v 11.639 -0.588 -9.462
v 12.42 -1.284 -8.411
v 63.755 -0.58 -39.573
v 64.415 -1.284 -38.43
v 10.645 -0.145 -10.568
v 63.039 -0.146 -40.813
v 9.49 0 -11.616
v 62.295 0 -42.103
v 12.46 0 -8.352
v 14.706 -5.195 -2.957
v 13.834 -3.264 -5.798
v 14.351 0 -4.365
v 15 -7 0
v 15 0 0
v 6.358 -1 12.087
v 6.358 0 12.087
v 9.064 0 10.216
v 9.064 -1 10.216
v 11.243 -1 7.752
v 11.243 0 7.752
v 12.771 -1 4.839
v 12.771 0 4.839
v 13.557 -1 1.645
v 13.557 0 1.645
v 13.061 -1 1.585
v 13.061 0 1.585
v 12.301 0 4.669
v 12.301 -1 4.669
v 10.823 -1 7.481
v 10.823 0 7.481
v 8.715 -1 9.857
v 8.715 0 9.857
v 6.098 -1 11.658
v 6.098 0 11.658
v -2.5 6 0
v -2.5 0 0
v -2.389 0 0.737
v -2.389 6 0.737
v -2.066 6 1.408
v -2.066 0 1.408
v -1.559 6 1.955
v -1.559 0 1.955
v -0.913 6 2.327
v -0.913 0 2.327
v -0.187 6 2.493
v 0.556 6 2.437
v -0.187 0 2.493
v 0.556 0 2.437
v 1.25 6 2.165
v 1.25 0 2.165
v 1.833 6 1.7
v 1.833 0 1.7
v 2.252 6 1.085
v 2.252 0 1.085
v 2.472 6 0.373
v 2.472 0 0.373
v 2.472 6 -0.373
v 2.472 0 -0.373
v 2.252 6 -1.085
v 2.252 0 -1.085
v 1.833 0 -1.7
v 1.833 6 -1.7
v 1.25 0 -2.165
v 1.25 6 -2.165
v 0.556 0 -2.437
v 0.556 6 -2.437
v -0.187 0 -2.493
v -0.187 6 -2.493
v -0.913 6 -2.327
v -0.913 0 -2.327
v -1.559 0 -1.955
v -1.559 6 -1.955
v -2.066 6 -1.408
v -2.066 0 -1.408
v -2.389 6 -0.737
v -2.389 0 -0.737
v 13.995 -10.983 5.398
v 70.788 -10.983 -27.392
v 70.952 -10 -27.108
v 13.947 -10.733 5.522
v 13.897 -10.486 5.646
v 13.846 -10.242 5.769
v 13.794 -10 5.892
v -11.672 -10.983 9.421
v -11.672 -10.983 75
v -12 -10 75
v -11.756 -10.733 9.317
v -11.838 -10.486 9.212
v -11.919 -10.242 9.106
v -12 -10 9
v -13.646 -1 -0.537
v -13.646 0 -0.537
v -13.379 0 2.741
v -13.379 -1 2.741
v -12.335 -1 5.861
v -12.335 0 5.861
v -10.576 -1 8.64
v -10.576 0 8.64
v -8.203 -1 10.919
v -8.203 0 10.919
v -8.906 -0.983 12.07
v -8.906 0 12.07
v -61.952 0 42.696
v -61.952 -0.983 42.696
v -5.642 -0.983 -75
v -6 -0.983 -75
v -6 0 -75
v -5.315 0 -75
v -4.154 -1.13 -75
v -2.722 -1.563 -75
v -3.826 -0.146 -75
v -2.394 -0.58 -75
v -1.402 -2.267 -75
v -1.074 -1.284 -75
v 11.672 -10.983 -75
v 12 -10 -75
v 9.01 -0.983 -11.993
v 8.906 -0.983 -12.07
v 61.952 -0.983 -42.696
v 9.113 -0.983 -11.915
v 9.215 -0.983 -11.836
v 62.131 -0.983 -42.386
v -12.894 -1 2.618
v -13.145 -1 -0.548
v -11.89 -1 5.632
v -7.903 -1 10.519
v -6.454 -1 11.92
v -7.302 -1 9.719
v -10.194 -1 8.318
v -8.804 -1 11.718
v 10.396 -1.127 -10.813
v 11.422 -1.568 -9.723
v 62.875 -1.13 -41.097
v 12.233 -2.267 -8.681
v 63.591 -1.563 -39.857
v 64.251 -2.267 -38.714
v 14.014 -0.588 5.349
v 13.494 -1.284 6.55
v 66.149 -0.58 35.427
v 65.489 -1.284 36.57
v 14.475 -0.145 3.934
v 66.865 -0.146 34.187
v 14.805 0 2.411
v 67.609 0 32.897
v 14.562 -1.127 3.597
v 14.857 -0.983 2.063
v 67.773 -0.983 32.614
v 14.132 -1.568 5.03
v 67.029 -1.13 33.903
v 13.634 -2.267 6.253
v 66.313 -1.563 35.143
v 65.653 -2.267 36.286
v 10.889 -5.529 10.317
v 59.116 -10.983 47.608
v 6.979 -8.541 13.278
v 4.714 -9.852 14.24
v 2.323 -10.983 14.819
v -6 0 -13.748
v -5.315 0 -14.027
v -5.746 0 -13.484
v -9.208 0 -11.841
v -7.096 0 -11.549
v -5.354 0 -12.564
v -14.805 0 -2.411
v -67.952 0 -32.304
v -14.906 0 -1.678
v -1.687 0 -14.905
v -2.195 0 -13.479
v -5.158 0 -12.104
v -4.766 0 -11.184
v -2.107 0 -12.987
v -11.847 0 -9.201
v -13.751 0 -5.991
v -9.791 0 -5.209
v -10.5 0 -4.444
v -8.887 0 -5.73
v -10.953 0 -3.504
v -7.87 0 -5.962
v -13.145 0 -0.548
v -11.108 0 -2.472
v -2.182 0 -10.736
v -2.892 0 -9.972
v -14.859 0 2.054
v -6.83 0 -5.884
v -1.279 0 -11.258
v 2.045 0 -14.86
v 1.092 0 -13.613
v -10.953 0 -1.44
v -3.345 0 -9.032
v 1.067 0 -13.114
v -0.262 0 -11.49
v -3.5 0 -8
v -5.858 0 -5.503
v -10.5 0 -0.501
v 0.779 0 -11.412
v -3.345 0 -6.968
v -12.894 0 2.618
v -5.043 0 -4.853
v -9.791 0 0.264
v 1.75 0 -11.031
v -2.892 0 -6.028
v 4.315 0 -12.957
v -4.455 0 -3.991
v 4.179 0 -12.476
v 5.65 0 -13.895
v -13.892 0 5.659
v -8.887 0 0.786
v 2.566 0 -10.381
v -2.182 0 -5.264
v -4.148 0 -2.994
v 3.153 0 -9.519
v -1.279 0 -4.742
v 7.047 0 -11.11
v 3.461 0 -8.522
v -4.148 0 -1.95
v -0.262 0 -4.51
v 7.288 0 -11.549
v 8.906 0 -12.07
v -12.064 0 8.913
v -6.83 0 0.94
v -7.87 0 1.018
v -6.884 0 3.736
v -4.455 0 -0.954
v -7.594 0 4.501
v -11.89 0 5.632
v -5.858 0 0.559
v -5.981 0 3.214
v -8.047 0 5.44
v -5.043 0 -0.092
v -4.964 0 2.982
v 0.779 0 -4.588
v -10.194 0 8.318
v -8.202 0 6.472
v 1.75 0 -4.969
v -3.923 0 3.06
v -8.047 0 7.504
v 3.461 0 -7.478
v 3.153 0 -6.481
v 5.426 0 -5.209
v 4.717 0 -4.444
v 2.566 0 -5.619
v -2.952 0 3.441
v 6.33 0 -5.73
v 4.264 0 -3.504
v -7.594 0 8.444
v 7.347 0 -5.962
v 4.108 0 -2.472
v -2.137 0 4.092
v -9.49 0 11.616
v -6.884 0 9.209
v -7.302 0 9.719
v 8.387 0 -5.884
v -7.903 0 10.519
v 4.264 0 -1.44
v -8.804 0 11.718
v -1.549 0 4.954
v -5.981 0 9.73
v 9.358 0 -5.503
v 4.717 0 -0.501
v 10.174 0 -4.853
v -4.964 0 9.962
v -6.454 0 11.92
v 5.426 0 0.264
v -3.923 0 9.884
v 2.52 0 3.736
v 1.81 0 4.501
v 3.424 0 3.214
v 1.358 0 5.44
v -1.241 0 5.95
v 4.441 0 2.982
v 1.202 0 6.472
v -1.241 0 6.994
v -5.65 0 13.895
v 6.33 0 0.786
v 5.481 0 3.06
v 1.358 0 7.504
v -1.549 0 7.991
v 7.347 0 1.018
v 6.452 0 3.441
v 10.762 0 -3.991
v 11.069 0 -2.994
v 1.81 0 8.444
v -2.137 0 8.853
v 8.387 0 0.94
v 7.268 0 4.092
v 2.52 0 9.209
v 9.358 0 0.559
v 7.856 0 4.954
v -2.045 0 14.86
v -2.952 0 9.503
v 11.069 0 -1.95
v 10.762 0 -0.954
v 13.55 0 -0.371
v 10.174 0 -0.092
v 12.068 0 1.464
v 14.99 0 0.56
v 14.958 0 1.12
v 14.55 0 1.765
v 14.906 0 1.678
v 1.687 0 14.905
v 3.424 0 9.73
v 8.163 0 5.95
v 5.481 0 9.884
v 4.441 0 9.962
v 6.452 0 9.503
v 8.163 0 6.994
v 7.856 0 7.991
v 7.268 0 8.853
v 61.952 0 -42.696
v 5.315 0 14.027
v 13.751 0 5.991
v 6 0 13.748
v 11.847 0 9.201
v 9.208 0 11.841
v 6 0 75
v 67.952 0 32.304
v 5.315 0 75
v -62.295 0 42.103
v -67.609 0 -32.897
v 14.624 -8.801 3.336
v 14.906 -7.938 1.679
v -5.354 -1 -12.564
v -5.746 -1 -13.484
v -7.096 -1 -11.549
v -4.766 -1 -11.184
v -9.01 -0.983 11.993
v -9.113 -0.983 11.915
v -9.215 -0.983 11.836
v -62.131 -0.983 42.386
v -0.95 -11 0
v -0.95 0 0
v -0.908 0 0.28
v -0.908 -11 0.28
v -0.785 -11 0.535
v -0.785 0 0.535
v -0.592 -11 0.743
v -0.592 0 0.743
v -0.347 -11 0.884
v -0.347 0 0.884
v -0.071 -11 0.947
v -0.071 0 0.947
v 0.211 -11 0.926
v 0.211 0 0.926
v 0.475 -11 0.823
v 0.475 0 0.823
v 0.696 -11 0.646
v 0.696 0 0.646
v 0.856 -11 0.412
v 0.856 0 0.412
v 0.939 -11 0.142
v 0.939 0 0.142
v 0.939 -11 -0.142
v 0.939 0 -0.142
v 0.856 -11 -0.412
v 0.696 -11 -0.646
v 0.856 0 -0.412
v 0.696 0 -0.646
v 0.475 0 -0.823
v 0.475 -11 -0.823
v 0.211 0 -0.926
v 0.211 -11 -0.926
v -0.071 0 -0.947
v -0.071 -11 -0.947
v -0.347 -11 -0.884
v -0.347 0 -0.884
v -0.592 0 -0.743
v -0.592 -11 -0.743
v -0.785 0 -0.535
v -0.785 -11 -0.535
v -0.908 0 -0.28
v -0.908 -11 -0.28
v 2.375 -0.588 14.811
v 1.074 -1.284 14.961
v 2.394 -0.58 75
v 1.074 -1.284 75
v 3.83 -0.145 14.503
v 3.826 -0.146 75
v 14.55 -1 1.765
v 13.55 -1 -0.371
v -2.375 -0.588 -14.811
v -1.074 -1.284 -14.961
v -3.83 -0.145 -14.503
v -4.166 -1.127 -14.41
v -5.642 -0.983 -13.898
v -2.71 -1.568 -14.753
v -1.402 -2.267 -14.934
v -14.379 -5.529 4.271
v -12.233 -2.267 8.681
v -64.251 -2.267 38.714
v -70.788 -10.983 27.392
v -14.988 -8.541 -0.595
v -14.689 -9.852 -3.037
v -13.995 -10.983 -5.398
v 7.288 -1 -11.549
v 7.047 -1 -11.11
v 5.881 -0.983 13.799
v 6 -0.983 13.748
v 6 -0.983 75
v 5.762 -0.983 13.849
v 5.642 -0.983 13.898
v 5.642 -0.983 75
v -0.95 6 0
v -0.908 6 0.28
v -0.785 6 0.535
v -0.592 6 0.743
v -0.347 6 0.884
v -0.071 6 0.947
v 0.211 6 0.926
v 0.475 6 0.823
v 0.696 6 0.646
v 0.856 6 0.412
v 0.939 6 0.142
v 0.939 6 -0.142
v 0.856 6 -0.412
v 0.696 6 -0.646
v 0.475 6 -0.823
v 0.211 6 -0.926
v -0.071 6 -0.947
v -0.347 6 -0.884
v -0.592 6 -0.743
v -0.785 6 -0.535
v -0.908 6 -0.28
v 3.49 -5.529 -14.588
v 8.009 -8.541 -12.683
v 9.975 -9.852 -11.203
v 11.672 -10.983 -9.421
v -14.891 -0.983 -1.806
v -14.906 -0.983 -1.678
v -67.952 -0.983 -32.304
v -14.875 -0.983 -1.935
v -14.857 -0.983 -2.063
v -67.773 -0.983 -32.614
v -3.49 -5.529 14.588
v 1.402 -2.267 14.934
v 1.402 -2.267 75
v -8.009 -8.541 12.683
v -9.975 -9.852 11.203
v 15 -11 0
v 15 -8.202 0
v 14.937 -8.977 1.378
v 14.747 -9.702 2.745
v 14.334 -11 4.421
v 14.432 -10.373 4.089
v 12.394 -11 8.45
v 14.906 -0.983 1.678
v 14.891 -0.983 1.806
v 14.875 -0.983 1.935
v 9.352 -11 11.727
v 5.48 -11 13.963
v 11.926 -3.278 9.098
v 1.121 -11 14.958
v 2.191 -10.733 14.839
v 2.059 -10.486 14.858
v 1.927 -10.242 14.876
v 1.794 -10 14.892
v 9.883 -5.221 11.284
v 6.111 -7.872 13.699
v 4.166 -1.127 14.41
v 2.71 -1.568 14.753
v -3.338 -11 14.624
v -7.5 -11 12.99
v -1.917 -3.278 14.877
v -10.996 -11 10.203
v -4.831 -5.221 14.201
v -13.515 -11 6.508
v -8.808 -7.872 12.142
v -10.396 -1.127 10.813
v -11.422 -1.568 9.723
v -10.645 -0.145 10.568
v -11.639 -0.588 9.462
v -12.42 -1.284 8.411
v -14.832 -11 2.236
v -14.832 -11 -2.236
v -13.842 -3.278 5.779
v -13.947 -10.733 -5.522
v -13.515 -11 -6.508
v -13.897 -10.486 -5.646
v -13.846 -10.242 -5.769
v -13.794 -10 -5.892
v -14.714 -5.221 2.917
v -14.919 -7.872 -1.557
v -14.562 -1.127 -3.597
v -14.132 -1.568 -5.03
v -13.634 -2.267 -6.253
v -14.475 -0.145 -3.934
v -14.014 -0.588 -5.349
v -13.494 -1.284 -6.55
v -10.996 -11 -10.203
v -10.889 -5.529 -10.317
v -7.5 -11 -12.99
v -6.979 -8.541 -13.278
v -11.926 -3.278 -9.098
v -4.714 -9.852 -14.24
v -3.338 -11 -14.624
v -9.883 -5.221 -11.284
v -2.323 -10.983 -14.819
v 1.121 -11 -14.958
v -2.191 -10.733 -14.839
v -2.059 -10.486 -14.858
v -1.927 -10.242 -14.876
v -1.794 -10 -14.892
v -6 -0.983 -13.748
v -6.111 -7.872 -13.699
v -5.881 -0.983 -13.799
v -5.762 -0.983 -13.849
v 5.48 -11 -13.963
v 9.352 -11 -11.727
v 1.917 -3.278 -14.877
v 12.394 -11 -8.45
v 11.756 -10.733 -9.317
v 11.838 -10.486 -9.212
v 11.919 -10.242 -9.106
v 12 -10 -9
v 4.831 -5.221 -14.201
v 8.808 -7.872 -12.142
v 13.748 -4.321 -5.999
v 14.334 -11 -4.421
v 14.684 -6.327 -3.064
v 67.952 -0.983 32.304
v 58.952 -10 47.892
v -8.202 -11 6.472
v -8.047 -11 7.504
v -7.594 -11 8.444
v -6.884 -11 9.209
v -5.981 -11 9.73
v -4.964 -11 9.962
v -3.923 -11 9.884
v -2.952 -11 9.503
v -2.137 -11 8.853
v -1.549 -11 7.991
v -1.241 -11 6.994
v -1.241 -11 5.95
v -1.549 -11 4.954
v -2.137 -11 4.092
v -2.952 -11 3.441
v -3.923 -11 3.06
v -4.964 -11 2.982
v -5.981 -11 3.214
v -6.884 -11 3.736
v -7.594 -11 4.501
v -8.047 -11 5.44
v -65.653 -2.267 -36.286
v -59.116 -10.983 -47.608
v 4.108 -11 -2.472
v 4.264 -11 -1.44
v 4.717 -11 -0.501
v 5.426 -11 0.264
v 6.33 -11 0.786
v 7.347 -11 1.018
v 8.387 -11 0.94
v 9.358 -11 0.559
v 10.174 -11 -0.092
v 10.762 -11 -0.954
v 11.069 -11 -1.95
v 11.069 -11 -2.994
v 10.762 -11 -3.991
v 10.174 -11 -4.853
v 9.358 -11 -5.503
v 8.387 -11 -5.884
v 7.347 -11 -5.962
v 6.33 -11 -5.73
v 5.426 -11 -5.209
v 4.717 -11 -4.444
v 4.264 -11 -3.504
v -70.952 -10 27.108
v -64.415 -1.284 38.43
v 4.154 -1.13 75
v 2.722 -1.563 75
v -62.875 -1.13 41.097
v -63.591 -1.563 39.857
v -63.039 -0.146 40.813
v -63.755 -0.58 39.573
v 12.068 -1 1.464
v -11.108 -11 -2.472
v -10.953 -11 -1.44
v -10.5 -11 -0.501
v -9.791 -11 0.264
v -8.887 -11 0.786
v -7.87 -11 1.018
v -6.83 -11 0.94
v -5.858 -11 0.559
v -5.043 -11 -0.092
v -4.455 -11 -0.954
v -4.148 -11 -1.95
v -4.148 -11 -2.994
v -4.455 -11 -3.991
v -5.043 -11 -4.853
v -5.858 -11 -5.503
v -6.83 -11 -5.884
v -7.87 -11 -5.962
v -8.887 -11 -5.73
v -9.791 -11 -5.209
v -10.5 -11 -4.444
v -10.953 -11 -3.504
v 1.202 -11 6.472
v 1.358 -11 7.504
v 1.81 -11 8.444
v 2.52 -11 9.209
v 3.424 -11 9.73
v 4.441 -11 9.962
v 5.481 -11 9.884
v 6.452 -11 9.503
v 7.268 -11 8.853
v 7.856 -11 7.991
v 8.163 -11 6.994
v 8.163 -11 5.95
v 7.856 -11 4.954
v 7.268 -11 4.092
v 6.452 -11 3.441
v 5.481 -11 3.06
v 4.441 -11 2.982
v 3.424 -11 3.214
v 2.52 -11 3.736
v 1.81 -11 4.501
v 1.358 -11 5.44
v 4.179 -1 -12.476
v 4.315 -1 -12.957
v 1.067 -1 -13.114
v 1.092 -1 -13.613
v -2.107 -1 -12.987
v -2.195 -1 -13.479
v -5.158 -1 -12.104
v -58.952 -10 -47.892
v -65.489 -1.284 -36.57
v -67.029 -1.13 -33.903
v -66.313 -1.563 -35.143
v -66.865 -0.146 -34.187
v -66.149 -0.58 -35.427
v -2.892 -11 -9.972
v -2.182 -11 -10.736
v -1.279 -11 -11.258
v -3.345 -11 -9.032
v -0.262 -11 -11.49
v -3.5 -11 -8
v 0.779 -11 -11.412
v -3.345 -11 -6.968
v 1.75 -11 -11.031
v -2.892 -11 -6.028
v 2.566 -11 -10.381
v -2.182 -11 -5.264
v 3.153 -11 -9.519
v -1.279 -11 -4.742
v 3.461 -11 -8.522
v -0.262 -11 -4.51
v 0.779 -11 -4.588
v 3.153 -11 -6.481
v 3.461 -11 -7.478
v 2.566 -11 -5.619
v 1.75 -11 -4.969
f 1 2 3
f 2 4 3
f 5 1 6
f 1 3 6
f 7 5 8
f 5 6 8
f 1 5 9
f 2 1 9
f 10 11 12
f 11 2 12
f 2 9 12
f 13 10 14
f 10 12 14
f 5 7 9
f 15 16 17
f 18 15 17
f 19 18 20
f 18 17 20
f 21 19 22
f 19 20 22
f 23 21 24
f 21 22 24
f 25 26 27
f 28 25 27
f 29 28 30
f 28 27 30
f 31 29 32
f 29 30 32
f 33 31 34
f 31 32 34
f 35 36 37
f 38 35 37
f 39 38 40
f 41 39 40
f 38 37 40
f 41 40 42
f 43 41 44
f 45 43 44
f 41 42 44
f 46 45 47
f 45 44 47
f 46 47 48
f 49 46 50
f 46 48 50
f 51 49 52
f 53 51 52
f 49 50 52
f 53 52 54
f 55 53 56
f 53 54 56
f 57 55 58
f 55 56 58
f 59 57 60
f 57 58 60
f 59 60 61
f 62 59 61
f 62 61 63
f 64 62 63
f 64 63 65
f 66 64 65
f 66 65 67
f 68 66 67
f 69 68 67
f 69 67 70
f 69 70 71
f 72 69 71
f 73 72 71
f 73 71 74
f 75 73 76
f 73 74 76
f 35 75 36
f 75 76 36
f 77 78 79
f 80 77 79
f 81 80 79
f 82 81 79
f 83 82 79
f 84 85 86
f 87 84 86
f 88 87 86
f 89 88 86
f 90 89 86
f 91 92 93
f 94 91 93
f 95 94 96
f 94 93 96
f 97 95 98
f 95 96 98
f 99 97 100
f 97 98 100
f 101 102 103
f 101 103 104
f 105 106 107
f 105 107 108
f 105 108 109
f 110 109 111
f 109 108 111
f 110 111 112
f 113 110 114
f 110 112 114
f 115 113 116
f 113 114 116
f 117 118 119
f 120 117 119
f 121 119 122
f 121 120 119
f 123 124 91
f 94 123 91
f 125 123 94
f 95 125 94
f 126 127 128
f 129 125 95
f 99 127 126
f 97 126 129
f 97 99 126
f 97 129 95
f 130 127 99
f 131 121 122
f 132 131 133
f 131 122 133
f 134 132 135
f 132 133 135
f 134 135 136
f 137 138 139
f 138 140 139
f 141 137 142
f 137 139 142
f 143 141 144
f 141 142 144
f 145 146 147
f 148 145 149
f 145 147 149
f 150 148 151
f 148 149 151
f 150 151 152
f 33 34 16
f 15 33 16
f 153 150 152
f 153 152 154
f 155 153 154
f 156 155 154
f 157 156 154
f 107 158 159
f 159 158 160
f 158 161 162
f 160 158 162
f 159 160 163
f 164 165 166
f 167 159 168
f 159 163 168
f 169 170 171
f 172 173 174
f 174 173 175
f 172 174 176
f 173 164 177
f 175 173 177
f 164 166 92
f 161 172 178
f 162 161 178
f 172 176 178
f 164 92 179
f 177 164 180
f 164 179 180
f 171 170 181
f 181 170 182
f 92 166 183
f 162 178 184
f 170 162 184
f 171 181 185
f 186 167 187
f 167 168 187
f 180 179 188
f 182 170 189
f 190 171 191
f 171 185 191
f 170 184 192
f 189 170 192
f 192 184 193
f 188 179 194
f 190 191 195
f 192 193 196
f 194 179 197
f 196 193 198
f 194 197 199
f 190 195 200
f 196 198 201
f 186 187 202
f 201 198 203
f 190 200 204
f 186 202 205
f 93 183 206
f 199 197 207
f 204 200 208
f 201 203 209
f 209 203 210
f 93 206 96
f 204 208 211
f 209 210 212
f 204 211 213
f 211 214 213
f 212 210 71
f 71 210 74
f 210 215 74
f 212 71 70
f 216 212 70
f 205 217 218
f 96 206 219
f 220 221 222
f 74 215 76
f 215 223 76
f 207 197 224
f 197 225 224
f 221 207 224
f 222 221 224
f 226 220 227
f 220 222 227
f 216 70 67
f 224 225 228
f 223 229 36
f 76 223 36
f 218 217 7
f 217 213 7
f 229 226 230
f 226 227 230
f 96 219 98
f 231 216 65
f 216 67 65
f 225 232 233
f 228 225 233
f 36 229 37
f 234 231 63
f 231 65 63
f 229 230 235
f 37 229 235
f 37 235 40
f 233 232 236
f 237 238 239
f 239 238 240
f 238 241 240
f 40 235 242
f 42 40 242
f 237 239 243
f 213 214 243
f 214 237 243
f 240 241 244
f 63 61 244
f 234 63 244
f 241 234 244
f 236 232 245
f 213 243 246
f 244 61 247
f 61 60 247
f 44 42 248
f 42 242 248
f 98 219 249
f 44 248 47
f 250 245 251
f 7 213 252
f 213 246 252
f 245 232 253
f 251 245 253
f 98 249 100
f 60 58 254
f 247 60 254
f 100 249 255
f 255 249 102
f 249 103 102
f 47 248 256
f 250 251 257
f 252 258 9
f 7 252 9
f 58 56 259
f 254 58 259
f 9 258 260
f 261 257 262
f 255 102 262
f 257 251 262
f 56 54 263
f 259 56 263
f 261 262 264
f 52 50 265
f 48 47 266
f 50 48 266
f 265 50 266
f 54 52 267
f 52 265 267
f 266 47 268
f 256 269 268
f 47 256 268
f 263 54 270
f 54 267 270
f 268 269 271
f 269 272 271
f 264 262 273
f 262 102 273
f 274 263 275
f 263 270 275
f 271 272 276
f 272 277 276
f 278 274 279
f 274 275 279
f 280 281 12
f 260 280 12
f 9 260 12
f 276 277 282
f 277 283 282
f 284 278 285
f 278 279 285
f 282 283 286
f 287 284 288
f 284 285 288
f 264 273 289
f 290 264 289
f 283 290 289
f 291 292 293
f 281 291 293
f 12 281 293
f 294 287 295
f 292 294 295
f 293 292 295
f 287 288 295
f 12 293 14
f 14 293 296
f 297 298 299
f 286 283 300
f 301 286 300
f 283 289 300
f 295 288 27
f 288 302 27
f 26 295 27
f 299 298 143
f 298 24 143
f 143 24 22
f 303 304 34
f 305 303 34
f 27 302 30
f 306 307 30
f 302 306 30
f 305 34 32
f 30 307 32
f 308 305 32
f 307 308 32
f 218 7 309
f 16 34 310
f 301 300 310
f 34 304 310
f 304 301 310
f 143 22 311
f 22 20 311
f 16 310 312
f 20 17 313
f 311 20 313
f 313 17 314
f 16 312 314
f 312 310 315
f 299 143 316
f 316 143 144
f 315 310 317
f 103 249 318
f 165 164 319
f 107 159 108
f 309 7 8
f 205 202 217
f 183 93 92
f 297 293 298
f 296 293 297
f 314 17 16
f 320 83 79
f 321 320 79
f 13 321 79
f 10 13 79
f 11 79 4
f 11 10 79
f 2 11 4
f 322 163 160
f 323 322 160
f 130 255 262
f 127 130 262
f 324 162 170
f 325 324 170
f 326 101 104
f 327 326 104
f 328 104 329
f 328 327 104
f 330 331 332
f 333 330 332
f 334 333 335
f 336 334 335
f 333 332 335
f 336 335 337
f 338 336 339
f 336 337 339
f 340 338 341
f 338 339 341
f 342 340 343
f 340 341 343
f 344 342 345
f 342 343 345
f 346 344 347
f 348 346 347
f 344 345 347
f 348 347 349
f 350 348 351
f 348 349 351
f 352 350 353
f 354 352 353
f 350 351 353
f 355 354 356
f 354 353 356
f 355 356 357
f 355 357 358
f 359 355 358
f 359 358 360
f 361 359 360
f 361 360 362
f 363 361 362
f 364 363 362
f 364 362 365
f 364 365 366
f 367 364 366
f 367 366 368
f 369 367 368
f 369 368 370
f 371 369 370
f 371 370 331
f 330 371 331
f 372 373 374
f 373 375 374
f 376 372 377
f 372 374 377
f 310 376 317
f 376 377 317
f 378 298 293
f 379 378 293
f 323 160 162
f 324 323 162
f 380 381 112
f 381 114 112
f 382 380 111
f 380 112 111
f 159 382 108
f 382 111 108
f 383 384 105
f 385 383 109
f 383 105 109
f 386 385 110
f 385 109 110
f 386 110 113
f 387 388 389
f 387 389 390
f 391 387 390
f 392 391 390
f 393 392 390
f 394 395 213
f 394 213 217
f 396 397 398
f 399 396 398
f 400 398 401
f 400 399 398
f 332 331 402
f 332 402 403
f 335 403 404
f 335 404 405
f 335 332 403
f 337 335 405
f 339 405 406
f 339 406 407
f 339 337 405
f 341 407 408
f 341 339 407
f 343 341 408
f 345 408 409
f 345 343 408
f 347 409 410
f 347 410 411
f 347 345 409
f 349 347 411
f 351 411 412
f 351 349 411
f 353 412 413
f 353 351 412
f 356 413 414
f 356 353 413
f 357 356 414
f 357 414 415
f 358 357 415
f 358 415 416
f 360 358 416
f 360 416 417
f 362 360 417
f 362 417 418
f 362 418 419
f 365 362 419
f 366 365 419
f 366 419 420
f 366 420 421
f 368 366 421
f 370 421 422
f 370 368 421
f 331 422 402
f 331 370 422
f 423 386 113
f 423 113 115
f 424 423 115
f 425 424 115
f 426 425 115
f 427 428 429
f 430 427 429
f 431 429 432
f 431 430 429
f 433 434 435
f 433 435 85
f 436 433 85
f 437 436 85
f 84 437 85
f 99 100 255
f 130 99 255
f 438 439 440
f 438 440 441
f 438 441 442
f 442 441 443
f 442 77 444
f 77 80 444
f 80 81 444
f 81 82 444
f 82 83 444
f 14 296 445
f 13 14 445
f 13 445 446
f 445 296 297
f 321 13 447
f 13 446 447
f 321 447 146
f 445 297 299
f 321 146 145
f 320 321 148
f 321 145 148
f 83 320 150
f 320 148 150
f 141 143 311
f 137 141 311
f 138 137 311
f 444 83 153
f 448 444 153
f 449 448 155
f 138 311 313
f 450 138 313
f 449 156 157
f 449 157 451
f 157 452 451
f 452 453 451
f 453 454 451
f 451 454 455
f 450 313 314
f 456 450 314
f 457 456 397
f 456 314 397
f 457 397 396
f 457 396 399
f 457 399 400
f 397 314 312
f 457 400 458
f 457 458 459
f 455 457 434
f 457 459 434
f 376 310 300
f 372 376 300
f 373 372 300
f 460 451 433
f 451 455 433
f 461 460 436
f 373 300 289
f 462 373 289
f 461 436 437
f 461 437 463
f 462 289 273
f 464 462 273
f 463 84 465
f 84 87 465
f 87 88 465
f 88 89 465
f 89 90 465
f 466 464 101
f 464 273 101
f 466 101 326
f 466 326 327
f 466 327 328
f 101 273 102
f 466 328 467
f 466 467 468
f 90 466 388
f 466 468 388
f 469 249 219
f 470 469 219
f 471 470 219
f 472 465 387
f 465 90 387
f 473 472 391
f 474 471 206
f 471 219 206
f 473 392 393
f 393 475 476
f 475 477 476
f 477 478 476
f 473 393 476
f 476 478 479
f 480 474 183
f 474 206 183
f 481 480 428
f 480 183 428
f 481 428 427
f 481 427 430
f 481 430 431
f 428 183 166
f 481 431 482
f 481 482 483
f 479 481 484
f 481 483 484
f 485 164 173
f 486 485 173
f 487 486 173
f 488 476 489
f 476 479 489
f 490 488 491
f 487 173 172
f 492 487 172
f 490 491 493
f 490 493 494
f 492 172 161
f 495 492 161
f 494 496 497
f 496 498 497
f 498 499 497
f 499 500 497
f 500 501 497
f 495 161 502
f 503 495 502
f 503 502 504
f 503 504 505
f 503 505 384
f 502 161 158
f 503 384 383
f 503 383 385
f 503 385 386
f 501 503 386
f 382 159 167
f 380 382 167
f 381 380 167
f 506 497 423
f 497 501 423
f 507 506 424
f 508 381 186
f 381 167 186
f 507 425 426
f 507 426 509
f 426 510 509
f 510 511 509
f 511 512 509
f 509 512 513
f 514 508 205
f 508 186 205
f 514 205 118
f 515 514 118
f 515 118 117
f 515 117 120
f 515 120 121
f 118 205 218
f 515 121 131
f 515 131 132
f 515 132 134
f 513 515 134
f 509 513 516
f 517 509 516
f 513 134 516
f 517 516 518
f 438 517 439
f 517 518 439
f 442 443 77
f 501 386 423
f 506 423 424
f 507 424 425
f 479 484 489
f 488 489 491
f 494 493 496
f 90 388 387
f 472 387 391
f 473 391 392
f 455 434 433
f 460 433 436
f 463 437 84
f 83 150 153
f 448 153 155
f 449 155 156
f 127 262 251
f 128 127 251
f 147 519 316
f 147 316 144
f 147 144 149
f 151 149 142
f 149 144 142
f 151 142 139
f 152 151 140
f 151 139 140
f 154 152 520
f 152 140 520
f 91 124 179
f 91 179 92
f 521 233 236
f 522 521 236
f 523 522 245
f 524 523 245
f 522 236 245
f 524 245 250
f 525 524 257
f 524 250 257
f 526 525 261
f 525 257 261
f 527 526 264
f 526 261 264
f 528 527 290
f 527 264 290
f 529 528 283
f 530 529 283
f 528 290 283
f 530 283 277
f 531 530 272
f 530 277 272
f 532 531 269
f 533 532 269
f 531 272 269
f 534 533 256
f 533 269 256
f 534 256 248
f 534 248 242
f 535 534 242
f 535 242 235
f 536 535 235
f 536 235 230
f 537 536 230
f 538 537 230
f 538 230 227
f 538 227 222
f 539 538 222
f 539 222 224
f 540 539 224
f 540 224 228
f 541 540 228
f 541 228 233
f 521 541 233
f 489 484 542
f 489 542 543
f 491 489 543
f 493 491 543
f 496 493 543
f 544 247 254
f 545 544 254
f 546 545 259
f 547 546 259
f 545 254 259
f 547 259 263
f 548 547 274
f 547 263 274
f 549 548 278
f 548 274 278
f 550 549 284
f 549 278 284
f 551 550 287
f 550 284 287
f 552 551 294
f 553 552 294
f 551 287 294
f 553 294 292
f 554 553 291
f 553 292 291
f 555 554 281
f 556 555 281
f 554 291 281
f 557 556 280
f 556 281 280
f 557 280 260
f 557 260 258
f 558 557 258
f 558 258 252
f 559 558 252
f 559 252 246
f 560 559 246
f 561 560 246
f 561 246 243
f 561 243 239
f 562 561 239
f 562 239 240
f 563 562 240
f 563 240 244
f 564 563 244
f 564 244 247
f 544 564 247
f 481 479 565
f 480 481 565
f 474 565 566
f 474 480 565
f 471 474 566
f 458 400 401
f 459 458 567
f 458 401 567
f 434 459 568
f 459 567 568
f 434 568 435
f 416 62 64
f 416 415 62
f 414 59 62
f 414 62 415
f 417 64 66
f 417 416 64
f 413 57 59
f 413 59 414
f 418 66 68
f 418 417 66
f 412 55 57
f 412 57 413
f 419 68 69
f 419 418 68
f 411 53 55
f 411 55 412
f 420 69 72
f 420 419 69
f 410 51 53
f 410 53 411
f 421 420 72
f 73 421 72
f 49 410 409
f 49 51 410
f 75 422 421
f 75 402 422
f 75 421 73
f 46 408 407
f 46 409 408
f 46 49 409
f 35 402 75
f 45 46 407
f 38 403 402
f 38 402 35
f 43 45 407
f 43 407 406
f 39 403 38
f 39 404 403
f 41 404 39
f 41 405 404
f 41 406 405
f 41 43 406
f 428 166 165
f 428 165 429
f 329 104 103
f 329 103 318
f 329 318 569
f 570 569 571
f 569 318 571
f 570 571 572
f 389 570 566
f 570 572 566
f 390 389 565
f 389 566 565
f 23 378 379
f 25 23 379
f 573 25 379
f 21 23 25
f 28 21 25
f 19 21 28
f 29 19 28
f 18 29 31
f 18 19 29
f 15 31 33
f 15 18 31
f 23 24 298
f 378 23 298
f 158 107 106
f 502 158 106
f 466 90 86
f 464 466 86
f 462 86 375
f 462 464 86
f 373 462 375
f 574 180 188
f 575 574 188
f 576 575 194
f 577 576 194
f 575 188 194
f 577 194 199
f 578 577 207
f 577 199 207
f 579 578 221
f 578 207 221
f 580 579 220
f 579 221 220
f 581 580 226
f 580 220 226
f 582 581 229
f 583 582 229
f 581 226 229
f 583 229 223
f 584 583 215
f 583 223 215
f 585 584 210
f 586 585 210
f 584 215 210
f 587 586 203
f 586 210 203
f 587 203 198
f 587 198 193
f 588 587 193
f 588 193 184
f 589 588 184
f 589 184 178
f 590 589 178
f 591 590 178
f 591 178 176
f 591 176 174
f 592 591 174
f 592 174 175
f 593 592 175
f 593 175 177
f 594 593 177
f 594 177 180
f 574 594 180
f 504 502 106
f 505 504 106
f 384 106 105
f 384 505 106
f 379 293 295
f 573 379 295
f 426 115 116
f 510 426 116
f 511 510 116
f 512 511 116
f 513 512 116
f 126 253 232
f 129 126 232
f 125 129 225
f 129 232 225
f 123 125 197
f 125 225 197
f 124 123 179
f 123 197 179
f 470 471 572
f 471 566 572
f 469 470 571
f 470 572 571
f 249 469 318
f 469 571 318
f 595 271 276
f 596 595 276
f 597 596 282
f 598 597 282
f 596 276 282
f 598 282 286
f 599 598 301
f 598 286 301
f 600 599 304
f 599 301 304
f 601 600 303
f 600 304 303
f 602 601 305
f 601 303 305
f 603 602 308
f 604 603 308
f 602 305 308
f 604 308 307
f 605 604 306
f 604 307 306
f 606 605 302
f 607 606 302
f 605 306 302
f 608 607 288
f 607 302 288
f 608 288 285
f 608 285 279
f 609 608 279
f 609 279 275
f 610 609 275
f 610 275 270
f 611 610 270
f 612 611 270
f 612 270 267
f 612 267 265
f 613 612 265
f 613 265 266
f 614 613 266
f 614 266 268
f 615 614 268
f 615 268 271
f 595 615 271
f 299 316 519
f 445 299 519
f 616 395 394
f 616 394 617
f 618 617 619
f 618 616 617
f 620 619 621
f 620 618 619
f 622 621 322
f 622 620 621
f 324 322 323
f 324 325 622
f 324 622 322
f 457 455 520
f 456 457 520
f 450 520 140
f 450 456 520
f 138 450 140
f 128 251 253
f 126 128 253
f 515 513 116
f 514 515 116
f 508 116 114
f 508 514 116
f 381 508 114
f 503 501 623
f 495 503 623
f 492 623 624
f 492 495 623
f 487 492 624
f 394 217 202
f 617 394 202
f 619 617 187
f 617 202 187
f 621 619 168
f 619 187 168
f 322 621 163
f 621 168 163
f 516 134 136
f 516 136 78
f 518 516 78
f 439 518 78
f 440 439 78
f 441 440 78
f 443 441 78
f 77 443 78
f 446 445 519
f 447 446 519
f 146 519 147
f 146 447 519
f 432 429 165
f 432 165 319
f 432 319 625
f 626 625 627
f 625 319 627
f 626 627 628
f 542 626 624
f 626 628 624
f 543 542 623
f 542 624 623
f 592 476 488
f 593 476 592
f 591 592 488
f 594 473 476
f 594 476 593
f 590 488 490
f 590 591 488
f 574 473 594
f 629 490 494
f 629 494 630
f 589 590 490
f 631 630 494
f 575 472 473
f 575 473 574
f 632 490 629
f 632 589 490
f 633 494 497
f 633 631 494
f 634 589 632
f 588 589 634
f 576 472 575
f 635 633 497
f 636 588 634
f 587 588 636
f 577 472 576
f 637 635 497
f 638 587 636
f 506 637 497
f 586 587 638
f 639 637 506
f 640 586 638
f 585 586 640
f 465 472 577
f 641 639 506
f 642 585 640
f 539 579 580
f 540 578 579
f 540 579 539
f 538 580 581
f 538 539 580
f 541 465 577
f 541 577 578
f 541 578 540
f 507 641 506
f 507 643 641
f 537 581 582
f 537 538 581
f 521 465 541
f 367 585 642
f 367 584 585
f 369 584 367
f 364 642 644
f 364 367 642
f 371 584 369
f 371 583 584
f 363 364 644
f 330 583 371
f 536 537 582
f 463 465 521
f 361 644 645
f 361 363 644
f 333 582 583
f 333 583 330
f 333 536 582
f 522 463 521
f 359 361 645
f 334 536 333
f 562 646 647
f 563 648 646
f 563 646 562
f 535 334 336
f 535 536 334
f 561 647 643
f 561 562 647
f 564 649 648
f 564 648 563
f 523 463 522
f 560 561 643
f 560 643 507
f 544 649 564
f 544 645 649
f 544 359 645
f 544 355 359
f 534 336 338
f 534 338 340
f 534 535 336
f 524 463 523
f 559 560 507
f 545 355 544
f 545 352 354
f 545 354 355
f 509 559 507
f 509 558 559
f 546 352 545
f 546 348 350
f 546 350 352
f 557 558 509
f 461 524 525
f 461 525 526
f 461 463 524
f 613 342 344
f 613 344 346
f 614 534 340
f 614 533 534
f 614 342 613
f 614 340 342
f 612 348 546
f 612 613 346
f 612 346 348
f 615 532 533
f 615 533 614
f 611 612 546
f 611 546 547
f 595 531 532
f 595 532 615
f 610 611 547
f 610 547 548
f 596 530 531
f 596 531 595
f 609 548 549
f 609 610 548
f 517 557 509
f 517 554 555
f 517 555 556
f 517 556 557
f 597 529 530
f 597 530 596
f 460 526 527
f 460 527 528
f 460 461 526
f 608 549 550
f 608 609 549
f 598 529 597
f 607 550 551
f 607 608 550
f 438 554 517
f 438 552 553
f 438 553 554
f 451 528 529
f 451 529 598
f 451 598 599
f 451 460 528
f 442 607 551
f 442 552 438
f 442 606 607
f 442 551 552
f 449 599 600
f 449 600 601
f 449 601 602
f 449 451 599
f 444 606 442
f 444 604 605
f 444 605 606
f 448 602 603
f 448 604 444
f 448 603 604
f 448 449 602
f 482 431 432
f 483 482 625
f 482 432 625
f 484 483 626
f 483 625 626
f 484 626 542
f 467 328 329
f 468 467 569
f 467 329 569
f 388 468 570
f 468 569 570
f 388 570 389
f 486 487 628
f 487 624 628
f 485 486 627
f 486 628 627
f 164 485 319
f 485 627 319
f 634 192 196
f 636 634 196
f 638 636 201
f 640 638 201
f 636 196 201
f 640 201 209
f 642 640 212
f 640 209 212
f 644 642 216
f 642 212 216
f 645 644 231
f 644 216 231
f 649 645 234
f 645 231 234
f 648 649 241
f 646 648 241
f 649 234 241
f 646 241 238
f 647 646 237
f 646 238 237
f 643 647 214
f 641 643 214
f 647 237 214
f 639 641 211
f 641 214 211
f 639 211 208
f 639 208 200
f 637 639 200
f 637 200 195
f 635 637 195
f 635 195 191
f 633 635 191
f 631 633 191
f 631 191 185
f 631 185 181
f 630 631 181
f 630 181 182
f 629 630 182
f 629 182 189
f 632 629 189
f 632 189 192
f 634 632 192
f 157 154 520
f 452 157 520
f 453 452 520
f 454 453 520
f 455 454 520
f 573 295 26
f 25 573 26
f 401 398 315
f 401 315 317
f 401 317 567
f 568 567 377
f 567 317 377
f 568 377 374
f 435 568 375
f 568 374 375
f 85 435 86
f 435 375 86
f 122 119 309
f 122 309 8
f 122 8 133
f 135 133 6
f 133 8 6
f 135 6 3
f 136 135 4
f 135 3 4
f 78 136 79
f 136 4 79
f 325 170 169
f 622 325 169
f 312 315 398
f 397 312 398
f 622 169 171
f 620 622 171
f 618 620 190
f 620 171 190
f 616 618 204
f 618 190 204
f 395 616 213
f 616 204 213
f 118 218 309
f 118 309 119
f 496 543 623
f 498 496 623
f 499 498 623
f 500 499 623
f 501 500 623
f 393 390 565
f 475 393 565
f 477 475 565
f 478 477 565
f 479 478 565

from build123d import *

# Parameters (mm, degrees)
F1_DEPTH  = 75
F2_R      = 7.644408
F4_COUNT  = 6
F5_R      = 15
F6_DEPTH  = 11
F7_R      = 3.5
F7_R_2    = 0.95
F8_DEPTH  = 25
F10_DEPTH = 1
F11_R     = 2.5
F11_R_2   = 0.95
F12_DEPTH = 6


with BuildPart() as f1:
    # F0 (on Top) → F1 (new body)
    with BuildSketch(Plane.XY):
        Polygon((11.672223, -10.983332), (12, -10), (-3, 0), (-3.327777, -0.983332), align=None)
        Polygon((-3.327777, -0.983332), (-3, 0), (-6, 0), (-6, -0.983332), align=None)
    extrude(amount=-F1_DEPTH)

    # F2
    f2_edges = [f1.edges().sort_by_distance(p)[0] for p in [
        (-3.327777, -0.983332, -37.5),
        (-3, 0, -37.5),
    ]]
    fillet(f2_edges, radius=F2_R)



with BuildPart() as f4_1:
    # F4: instance of F1
    add(f1.part.rotate(Axis((0, 13.525062, 0), (0, 1, 0)), 1 * 360 / F4_COUNT))


with BuildPart() as f4_2:
    # F4: instance of F1
    add(f1.part.rotate(Axis((0, 13.525062, 0), (0, 1, 0)), 2 * 360 / F4_COUNT))


with BuildPart() as f4_3:
    # F4: instance of F1
    add(f1.part.rotate(Axis((0, 13.525062, 0), (0, 1, 0)), 3 * 360 / F4_COUNT))


with BuildPart() as f4_4:
    # F4: instance of F1
    add(f1.part.rotate(Axis((0, 13.525062, 0), (0, 1, 0)), 4 * 360 / F4_COUNT))


with BuildPart() as f4_5:
    # F4: instance of F1
    add(f1.part.rotate(Axis((0, 13.525062, 0), (0, 1, 0)), 5 * 360 / F4_COUNT))


with BuildPart() as f1_1:
    add(f1.part)

    add(f4_1.part)  # F6 merges F4_1

    add(f4_2.part)  # F6 merges F4_2

    add(f4_3.part)  # F6 merges F4_3

    add(f4_4.part)  # F6 merges F4_4

    add(f4_5.part)  # F6 merges F4_5
    # F5 (on Front) → F6 (join)
    with BuildSketch(Plane.XZ):
        Circle(F5_R)
    extrude(amount=F6_DEPTH)

    # F7 (on face) → F8 (cut)
    with BuildSketch(Plane(origin=(0, 0, 0), x_dir=(-1, 0, 0), z_dir=(0, 1, 0))):
        with Locations((-4.702282, 6.472136)):
            Circle(F7_R)
        with Locations((-7.608452, -2.472136)):
            Circle(F7_R)
        with Locations((0, -8)):
            Circle(F7_R)
        with Locations((7.608452, -2.472136)):
            Circle(F7_R)
        with Locations((4.702282, 6.472136)):
            Circle(F7_R)
        Circle(F7_R_2)
    extrude(amount=-F8_DEPTH, mode=Mode.SUBTRACT)

    # F9 (on face) → F10 (cut)
    with BuildSketch(Plane(origin=(0, 0, 0), x_dir=(-1, 0, 0), z_dir=(0, 1, 0))):
        with BuildLine():
            ThreePointArc((5.158171, -12.103592), (-1.067262, -13.113528), (-7.047458, -11.110221))
            Line((-7.047458, -11.110221), (-7.288358, -11.549476))
            ThreePointArc((-7.288358, -11.549476), (-1.091943, -13.613164), (5.354197, -12.563564))
            Line((5.354197, -12.563564), (5.746248, -13.483508))
            Line((5.746248, -13.483508), (7.096071, -11.549476))
            Line((7.096071, -11.549476), (4.76612, -11.183649))
            Line((4.76612, -11.183649), (5.158171, -12.103592))
        make_face()
        with BuildLine():
            Line((8.803936, 11.71815), (6.454104, 11.920116))
            Line((6.454104, 11.920116), (7.302264, 9.719405))
            Line((7.302264, 9.719405), (7.902933, 10.518903))
            ThreePointArc((7.902933, 10.518903), (11.89028, 5.632489), (13.145463, -0.548167))
            Line((13.145463, -0.548167), (13.646319, -0.537165))
            ThreePointArc((13.646319, -0.537165), (12.335317, 5.860932), (8.203267, 10.918652))
            Line((8.203267, 10.918652), (8.803936, 11.71815))
        make_face()
        with BuildLine():
            Line((-14.550184, 1.765357), (-13.550175, -0.370639))
            Line((-13.550175, -0.370639), (-12.068384, 1.464243))
            Line((-12.068384, 1.464243), (-13.061104, 1.584689))
            ThreePointArc((-13.061104, 1.584689), (-10.823018, 7.48104), (-6.098005, 11.658388))
            Line((-6.098005, 11.658388), (-6.357961, 12.086641))
            ThreePointArc((-6.357961, 12.086641), (-11.243374, 7.752232), (-13.557464, 1.644912))
            Line((-13.557464, 1.644912), (-14.550184, 1.765357))
        make_face()
    extrude(amount=-F10_DEPTH, mode=Mode.SUBTRACT)

    # F11 (on face) → F12 (join)
    with BuildSketch(Plane(origin=(0, 0, 0), x_dir=(-1, 0, 0), z_dir=(0, 1, 0))):
        Circle(F11_R)
        Circle(F11_R_2, mode=Mode.SUBTRACT)
    extrude(amount=F12_DEPTH)


solid = f1_1.part
